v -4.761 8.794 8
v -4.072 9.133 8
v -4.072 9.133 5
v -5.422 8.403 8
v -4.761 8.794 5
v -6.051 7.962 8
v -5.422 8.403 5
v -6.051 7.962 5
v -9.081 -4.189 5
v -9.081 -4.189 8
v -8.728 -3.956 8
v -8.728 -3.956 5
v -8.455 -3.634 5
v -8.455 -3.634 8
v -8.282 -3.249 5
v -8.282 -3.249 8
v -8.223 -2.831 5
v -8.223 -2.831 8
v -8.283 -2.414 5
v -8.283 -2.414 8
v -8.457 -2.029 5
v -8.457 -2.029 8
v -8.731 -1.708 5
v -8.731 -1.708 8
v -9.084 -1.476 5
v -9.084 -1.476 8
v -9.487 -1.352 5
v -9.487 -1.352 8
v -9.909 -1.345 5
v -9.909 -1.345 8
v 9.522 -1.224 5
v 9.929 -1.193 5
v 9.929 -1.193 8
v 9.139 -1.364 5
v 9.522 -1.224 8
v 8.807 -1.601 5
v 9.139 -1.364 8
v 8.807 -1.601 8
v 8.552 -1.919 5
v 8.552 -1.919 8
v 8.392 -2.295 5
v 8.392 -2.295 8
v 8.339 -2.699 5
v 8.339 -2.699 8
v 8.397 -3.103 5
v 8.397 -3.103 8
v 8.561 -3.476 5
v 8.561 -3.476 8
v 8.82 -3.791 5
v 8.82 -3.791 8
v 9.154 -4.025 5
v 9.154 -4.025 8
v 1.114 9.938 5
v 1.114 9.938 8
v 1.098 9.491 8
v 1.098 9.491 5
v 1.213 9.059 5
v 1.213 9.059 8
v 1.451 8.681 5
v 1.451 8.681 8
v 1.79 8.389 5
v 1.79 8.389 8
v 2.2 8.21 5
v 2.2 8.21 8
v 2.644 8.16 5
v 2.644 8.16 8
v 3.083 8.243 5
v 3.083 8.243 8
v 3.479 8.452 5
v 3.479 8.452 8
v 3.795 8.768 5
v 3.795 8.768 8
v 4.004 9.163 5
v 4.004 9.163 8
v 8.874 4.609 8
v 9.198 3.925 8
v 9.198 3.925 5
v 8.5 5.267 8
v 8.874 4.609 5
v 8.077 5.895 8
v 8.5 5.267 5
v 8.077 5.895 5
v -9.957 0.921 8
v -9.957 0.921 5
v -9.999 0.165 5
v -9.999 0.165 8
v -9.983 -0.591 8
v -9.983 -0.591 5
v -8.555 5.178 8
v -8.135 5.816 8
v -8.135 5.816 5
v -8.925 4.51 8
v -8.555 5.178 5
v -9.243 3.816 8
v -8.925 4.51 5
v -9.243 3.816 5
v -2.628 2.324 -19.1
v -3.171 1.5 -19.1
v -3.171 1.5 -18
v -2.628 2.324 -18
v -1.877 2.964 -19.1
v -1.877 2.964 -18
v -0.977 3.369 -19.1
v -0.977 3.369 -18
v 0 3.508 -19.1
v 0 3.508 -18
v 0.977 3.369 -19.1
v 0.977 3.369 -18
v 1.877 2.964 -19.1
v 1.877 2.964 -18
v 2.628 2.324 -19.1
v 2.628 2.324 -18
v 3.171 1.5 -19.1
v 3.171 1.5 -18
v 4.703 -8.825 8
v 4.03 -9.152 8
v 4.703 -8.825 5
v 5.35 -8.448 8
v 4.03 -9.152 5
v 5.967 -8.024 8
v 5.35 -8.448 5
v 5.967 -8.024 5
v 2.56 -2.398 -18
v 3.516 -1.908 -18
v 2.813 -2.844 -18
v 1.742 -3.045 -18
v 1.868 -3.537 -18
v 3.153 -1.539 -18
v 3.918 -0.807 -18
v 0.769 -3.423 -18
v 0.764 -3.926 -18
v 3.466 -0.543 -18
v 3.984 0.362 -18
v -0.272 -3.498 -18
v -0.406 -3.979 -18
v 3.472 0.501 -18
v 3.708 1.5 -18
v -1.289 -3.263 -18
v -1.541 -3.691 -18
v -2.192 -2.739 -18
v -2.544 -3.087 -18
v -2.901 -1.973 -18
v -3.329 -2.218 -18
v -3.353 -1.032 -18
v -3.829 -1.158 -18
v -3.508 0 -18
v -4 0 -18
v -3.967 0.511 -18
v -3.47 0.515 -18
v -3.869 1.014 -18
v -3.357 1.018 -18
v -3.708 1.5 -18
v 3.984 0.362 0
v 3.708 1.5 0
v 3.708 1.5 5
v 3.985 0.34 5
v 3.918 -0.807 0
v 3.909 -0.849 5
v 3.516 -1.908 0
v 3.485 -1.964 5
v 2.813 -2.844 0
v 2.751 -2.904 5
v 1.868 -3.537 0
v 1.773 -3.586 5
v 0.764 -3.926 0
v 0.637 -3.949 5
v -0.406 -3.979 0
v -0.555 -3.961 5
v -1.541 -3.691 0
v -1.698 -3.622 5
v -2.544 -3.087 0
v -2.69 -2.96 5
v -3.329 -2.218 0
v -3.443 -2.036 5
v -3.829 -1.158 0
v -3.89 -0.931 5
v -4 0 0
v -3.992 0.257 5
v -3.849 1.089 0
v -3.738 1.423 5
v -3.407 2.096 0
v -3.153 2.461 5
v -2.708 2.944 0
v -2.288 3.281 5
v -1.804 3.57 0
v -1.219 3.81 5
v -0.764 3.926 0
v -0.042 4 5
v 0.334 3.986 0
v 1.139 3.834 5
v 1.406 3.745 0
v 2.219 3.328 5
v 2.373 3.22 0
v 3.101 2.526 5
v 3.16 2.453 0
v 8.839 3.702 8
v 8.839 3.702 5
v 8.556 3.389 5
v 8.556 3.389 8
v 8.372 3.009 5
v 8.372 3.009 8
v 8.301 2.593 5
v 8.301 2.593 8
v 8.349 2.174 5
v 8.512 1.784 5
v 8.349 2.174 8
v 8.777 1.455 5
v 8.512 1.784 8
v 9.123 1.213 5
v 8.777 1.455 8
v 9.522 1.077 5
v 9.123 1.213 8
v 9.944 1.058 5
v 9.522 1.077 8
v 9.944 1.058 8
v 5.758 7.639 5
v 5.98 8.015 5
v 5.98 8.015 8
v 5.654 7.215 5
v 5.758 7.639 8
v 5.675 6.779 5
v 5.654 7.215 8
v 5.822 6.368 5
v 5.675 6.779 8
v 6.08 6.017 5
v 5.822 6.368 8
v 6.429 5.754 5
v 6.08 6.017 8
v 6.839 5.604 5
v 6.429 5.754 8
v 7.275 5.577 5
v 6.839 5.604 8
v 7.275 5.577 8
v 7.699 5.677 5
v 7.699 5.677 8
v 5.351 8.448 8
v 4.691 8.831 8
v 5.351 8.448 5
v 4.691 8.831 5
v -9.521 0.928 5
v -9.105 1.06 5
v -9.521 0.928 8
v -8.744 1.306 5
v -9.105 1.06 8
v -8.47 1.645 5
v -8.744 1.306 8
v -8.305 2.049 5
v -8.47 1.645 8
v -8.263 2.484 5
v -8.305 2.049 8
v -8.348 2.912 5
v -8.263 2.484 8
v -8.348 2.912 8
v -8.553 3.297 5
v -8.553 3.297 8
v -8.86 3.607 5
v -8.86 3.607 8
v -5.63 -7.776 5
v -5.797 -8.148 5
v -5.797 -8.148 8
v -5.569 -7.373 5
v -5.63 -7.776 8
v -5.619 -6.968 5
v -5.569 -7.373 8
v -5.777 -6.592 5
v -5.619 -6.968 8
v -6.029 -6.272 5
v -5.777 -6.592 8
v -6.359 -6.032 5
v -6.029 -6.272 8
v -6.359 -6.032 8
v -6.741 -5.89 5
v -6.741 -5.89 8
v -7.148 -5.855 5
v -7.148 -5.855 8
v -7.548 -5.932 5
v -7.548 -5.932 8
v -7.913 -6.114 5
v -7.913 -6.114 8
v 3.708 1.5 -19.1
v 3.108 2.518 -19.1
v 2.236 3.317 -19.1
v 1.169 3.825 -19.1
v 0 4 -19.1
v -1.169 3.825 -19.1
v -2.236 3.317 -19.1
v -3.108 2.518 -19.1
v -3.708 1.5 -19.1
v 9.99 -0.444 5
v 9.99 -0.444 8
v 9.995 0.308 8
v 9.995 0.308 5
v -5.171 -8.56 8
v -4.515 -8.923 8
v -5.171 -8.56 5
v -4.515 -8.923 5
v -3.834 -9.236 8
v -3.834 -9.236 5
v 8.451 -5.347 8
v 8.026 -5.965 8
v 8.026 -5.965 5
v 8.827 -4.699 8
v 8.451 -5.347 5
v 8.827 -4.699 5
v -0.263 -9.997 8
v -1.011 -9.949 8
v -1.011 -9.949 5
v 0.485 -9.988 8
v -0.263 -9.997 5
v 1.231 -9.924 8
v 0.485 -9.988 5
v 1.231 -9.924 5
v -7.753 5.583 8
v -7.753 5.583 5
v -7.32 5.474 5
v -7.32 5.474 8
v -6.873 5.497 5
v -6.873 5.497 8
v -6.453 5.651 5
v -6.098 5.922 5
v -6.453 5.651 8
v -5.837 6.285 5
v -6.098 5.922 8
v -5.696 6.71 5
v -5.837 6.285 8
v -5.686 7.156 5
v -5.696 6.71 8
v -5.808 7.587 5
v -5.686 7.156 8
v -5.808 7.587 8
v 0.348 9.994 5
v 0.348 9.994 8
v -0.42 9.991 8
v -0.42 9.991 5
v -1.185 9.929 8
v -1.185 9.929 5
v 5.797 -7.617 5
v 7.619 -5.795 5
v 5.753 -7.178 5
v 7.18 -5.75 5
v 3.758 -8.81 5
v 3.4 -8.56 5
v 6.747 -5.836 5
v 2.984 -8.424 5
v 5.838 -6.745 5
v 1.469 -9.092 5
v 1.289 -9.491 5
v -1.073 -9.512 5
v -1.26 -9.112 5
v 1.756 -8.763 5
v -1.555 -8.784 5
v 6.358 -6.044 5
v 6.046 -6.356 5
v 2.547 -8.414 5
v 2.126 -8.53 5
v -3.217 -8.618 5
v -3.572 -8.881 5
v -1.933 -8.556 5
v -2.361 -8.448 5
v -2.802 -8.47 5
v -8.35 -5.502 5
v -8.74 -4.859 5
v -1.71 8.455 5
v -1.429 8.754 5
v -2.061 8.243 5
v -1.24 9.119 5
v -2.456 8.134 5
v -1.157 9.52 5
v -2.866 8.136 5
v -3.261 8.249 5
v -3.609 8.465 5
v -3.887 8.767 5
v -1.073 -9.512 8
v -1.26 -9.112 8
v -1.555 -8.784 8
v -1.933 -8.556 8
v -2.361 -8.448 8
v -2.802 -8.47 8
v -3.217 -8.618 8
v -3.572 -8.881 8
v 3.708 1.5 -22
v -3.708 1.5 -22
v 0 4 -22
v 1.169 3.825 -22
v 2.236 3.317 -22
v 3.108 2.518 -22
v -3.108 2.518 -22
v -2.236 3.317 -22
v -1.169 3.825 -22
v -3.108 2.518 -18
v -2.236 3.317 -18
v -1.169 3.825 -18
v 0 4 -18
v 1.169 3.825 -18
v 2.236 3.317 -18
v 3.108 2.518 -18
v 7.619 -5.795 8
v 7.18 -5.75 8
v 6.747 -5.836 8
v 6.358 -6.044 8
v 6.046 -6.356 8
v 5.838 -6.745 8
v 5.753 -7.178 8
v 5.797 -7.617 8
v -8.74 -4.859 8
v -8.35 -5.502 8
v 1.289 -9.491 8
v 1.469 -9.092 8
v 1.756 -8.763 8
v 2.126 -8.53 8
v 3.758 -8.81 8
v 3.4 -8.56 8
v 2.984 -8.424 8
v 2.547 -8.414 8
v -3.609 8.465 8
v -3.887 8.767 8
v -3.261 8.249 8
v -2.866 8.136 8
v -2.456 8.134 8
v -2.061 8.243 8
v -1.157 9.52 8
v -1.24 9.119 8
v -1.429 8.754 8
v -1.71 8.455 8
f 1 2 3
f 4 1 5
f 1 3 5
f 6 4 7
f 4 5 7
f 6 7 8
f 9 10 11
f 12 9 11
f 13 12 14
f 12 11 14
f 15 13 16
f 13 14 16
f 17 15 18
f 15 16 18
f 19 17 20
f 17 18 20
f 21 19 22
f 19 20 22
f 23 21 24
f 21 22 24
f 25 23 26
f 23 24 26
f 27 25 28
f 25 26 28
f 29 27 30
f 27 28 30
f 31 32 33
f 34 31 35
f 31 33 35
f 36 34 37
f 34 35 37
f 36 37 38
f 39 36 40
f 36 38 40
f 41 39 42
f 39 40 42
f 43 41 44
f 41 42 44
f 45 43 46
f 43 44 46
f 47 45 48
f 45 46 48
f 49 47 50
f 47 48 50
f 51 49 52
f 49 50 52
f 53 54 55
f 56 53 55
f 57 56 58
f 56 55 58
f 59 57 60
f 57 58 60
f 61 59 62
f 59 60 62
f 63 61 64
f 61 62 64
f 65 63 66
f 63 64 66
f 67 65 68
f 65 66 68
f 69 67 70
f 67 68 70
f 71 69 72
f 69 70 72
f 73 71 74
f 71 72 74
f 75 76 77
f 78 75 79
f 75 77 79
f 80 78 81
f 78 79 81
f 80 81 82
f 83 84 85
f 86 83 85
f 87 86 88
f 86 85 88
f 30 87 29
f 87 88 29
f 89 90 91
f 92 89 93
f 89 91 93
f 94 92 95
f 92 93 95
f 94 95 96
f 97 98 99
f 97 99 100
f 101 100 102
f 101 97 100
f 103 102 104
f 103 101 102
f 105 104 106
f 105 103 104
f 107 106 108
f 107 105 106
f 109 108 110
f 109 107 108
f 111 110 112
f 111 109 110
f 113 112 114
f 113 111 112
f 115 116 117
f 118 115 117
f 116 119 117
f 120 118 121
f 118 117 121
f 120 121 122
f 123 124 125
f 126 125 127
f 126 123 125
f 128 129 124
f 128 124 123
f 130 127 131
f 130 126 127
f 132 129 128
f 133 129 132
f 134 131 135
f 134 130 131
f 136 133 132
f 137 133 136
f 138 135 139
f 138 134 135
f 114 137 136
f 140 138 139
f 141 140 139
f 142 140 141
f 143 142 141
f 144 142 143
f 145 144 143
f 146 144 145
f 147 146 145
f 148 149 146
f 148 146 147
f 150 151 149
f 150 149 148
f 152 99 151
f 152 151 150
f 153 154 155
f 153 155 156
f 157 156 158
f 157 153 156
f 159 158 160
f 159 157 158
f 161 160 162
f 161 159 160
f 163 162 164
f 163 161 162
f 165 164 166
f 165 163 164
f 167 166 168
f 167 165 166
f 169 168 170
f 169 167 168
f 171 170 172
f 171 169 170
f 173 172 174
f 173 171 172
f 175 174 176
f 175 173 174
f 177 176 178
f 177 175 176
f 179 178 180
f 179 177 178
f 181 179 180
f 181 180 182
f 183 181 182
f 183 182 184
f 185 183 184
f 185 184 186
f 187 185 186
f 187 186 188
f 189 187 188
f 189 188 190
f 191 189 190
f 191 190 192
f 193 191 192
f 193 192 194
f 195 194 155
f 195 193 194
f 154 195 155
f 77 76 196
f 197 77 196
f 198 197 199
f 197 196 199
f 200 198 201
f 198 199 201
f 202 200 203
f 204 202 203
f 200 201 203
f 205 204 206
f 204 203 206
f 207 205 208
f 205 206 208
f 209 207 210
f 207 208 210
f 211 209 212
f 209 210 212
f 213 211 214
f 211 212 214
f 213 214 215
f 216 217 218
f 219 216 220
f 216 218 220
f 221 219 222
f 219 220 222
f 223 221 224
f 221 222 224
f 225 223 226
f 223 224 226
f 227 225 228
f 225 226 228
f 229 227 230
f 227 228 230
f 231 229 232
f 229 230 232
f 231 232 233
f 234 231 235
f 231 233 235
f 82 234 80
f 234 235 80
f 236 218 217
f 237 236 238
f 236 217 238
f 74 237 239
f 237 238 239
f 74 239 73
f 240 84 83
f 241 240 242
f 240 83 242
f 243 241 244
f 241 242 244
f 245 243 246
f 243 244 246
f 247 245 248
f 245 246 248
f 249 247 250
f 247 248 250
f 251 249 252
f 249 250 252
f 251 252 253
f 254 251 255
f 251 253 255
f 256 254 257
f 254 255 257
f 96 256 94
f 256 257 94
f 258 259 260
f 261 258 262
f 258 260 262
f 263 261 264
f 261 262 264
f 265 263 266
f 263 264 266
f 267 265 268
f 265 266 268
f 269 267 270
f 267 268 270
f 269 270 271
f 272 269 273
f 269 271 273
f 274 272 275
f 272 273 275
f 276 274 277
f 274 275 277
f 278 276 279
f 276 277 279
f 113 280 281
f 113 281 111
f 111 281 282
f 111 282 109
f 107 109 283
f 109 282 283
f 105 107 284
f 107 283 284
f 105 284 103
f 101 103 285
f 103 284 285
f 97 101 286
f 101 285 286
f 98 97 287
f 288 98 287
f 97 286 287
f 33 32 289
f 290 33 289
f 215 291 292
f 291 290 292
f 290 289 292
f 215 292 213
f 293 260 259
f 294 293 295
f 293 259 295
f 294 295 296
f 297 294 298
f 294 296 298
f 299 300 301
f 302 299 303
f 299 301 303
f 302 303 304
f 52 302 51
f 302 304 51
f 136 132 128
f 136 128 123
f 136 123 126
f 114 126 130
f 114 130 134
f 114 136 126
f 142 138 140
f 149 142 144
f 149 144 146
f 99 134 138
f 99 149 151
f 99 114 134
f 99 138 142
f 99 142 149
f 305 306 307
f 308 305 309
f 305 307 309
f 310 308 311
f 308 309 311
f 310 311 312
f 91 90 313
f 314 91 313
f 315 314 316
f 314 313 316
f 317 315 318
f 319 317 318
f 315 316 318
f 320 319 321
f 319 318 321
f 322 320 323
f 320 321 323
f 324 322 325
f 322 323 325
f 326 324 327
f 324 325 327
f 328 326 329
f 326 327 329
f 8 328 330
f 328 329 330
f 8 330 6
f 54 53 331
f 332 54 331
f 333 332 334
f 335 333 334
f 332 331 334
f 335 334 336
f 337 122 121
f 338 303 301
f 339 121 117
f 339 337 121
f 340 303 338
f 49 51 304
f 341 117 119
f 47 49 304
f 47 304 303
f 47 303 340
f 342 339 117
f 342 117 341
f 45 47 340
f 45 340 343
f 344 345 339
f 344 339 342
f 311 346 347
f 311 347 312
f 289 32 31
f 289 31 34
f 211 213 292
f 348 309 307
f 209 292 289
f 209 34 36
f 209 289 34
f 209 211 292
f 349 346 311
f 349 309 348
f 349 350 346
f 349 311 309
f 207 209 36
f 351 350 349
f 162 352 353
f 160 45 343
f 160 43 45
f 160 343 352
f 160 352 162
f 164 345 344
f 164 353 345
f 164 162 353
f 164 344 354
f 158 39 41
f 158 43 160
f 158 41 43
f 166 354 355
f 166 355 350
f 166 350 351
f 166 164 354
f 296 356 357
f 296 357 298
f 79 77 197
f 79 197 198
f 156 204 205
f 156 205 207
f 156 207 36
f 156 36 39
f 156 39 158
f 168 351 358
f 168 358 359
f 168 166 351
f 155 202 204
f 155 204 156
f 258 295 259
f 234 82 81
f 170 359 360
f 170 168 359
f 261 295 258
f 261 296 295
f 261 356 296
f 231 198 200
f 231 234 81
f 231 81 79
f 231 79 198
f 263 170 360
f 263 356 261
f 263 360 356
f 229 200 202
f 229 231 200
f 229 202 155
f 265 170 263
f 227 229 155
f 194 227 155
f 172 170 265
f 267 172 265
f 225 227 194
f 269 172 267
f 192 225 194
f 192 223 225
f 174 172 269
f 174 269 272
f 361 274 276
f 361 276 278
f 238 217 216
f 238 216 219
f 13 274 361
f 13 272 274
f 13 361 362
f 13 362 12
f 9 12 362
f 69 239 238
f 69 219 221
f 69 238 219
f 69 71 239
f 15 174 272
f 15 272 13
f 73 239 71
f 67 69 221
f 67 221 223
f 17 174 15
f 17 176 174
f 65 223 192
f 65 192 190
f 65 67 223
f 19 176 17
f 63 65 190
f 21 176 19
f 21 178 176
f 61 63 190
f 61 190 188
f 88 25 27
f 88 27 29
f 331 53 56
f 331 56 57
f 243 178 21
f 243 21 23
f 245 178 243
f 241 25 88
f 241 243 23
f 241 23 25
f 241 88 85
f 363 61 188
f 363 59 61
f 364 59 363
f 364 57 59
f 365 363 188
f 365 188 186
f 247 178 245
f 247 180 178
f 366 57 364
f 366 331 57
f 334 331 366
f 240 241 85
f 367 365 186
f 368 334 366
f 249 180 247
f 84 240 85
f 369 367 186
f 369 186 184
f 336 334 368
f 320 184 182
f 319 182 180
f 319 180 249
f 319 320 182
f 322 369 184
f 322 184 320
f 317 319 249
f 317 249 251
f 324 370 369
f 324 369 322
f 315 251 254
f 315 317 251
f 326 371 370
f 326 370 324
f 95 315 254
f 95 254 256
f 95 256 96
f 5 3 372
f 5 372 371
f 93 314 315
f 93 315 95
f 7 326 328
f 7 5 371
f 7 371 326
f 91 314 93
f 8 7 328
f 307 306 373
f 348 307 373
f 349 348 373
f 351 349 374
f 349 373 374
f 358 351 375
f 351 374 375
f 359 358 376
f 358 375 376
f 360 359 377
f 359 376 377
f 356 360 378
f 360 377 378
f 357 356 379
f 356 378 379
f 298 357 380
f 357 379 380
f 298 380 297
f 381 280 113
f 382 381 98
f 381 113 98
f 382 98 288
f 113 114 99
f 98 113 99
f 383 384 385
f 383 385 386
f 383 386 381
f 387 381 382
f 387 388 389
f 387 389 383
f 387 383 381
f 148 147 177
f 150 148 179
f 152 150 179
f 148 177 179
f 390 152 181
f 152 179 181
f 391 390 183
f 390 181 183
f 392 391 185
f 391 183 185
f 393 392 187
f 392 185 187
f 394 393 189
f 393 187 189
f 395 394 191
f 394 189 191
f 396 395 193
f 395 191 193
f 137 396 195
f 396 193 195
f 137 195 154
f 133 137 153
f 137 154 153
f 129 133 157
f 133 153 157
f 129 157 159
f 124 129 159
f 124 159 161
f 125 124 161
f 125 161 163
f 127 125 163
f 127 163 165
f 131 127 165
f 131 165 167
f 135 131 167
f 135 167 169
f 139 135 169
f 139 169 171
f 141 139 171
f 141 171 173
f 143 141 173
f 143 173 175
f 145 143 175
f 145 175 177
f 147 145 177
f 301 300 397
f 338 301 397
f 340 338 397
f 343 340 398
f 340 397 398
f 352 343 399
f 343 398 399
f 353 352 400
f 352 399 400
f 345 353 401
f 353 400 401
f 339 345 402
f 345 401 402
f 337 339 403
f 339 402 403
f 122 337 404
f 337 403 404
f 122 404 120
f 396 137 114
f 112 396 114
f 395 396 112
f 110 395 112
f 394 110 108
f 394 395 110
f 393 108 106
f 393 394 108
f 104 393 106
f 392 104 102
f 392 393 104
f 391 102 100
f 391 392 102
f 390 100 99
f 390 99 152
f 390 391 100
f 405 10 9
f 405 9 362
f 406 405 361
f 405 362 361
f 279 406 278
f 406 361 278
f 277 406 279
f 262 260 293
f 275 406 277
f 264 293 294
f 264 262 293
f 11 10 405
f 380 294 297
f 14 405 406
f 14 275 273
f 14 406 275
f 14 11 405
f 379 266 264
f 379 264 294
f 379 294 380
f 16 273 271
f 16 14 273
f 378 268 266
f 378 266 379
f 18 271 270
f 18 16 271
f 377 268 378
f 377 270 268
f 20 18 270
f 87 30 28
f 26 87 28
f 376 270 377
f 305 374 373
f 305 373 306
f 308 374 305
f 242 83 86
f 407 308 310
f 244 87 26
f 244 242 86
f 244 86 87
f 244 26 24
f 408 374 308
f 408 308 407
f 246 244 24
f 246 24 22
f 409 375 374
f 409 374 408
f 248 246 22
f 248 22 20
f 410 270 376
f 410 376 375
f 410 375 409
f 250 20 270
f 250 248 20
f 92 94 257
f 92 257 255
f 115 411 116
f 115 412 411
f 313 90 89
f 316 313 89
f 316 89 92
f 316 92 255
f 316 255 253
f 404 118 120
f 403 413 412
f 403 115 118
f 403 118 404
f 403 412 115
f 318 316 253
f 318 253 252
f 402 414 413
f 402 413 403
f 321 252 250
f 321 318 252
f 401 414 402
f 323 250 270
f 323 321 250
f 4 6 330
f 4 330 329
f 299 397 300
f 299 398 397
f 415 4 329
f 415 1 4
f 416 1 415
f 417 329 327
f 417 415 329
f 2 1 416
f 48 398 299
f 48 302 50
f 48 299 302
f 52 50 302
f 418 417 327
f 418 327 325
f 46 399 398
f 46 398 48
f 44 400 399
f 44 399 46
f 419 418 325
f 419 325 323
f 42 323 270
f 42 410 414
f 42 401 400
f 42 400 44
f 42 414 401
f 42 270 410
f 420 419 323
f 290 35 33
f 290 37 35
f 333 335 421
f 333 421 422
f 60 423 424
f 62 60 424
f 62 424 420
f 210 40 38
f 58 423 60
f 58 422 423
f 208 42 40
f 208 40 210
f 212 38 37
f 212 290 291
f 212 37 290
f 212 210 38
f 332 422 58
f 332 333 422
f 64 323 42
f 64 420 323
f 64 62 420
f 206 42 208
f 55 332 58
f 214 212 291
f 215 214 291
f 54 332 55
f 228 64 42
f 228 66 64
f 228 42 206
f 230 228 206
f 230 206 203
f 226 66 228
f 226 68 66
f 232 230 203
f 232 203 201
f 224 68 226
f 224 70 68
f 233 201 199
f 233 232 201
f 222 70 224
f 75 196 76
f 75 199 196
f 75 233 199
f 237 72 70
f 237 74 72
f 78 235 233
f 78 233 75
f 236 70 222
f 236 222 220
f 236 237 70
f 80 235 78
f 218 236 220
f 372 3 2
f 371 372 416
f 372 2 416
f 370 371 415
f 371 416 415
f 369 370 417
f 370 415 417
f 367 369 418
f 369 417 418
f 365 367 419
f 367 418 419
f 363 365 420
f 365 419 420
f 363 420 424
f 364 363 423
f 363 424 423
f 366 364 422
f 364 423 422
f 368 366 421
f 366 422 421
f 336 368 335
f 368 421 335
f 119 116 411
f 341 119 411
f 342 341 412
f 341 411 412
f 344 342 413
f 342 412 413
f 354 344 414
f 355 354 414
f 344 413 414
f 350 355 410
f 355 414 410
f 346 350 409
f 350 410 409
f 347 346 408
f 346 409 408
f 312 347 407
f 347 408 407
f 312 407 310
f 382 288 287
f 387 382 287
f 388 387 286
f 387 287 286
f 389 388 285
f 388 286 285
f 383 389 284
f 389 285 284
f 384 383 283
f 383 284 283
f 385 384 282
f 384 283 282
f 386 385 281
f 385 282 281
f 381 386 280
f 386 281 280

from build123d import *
from build123d.topology import SkipClean

# Parameters (mm, degrees)
SKETCH2_R           = 10
BOSS_EXTRUDE1_DEPTH = 8
SKETCH3_R           = 4
BOSS_EXTRUDE2_DEPTH = 18
BOSS_EXTRUDE3_DEPTH = 4
SKETCH5_R           = 1.5
CUT_EXTRUDE1_DEPTH  = 34.166247904
SKETCH7_R           = 4
CUT_EXTRUDE4_DEPTH  = 5
SKETCH8_W           = 2
SKETCH8_H           = 1.1


with BuildPart() as part:
    # Sketch2 → Boss-Extrude1 (new body)
    with BuildSketch(Plane.XY):
        Circle(SKETCH2_R)
    extrude(amount=BOSS_EXTRUDE1_DEPTH)

    # Sketch3 → Boss-Extrude2 (add)
    with BuildSketch(Plane(origin=(0, 0, 0), x_dir=(-1, 0, 0), z_dir=(0, 0, -1))):
        Circle(SKETCH3_R)
    extrude(amount=BOSS_EXTRUDE2_DEPTH)

    # Sketch4 → Boss-Extrude3 (add)
    with BuildSketch(Plane(origin=(0, 0, -18), x_dir=(-1, 0, 0), z_dir=(0, 0, -1))):
        with BuildLine():
            Line((-3.708099244, 1.5), (3.708099244, 1.5))
            ThreePointArc((3.708099244, 1.5), (0, 4), (-3.708099244, 1.5))
        make_face()
    extrude(amount=BOSS_EXTRUDE3_DEPTH)

    # Sketch5 → Cut-Extrude1 (cut, through all)
    with BuildSketch(Plane.XY.offset(8)):
        with Locations((2.588190451, 9.659258263)):
            Circle(SKETCH5_R)
        with Locations((7.146706221, 7.071620464)):
            Circle(SKETCH5_R)
        with Locations((9.800677781, 2.551402509)):
            Circle(SKETCH5_R)
        with Locations((9.838975596, -2.69020685)):
            Circle(SKETCH5_R)
        with Locations((7.251337797, -7.24872262)):
            Circle(SKETCH5_R)
        with Locations((2.731119842, -9.90269418)):
            Circle(SKETCH5_R)
        with Locations((-2.510489517, -9.940991995)):
            Circle(SKETCH5_R)
        with Locations((-7.069005287, -7.353354196)):
            Circle(SKETCH5_R)
        with Locations((-9.722976847, -2.833136241)):
            Circle(SKETCH5_R)
        with Locations((-9.761274662, 2.408473118)):
            Circle(SKETCH5_R)
        with Locations((-7.173636863, 6.966988887)):
            Circle(SKETCH5_R)
        with Locations((-2.653418908, 9.620960448)):
            Circle(SKETCH5_R)
    extrude(amount=-CUT_EXTRUDE1_DEPTH, mode=Mode.SUBTRACT)

    # Sketch7 → Cut-Extrude4 (cut)
    with SkipClean():  # the faces are left unmerged after this step: merging them gives an invalid solid
        with BuildSketch(Plane(origin=(0, 0, 0), x_dir=(-1, 0, 0), z_dir=(0, 0, -1))):
            with BuildLine():
                ThreePointArc((-9.19759453, 3.924825457), (-8.349060466, 2.173504149), (-9.943847621, 1.058250676))
                ThreePointArc((-9.943847621, 1.058250676), (-9.999770505, -0.067748467), (-9.928596161, -1.192886526))
                ThreePointArc((-9.928596161, -1.192886526), (-8.392085872, -2.294593241), (-9.154279225, -4.024819483))
                ThreePointArc((-9.154279225, -4.024819483), (-8.644955004, -5.026405572), (-8.026480805, -5.964528975))
                ThreePointArc((-8.026480805, -5.964528975), (-6.190486346, -6.188253762), (-5.967423839, -8.024328802))
                ThreePointArc((-5.967423839, -8.024328802), (-5.030319112, -8.642678383), (-4.029806132, -9.152085147))
                ThreePointArc((-4.029806132, -9.152085147), (-2.332315615, -8.45668063), (-1.231269876, -9.923909234))
                ThreePointArc((-1.231269876, -9.923909234), (-0.11108008, -9.999383042), (1.010509904, -9.948812479))
                ThreePointArc((1.010509904, -9.948812479), (2.143211572, -8.486651282), (3.834327269, -9.235688084))
                ThreePointArc((3.834327269, -9.235688084), (4.846248967, -8.747220755), (5.796982612, -8.148312255))
                ThreePointArc((5.796982612, -8.148312255), (6.029458943, -6.27199237), (7.91348406, -6.113654393))
                ThreePointArc((7.91348406, -6.113654393), (8.551343346, -5.184064715), (9.080514936, -4.1885855))
                ThreePointArc((9.080514936, -4.1885855), (8.282868126, -2.413509179), (9.909171595, -1.344737264))
                ThreePointArc((9.909171595, -1.344737264), (9.997729971, -0.213062014), (9.957464452, 0.921358608))
                ThreePointArc((9.957464452, 0.921358608), (8.30494986, 2.049143086), (9.24320622, 3.816168074))
                ThreePointArc((9.24320622, 3.816168074), (8.746443519, 4.847651572), (8.135038438, 5.815595379))
                ThreePointArc((8.135038438, 5.815595379), (6.097591334, 5.921940554), (6.050828458, 7.961625146))
                ThreePointArc((6.050828458, 7.961625146), (5.095196746, 8.604590061), (4.071970326, 9.1334034))
                ThreePointArc((4.071970326, 9.1334034), (2.254614681, 8.174946897), (1.185490282, 9.929482))
                ThreePointArc((1.185490282, 9.929482), (0.035850285, 9.999935738), (-1.114265315, 9.937726742))
                ThreePointArc((-1.114265315, 9.937726742), (-2.199961883, 8.210369523), (-4.003881302, 9.163456472))
                ThreePointArc((-4.003881302, 9.163456472), (-5.025019239, 8.645760906), (-5.980292673, 8.014742638))
                ThreePointArc((-5.980292673, 8.014742638), (-6.080459662, 6.016576258), (-8.077456677, 5.895311156))
                ThreePointArc((-8.077456677, 5.895311156), (-8.693535071, 4.941907322), (-9.19759453, 3.924825457))
            make_face()
            with Locations(Location((0, 0, 0), (0, 0, 157.975687163))):
                Circle(SKETCH7_R, mode=Mode.SUBTRACT)
        extrude(amount=-CUT_EXTRUDE4_DEPTH, mode=Mode.SUBTRACT)

    # Sketch8 → Cut-Revolve2 (revolve, cut)
    with SkipClean():  # the faces are left unmerged after this step: merging them gives an invalid solid
        with BuildSketch(Plane(origin=(0, 0, 0), x_dir=(1, 0, 0), z_dir=(0, 1, 0))):
            with Locations((-4.508099244, 18.55)):
                Rectangle(SKETCH8_W, SKETCH8_H)
        revolve(axis=Axis((0, 0, 0), (0, 0, -1)), mode=Mode.SUBTRACT)


solid = part.part
